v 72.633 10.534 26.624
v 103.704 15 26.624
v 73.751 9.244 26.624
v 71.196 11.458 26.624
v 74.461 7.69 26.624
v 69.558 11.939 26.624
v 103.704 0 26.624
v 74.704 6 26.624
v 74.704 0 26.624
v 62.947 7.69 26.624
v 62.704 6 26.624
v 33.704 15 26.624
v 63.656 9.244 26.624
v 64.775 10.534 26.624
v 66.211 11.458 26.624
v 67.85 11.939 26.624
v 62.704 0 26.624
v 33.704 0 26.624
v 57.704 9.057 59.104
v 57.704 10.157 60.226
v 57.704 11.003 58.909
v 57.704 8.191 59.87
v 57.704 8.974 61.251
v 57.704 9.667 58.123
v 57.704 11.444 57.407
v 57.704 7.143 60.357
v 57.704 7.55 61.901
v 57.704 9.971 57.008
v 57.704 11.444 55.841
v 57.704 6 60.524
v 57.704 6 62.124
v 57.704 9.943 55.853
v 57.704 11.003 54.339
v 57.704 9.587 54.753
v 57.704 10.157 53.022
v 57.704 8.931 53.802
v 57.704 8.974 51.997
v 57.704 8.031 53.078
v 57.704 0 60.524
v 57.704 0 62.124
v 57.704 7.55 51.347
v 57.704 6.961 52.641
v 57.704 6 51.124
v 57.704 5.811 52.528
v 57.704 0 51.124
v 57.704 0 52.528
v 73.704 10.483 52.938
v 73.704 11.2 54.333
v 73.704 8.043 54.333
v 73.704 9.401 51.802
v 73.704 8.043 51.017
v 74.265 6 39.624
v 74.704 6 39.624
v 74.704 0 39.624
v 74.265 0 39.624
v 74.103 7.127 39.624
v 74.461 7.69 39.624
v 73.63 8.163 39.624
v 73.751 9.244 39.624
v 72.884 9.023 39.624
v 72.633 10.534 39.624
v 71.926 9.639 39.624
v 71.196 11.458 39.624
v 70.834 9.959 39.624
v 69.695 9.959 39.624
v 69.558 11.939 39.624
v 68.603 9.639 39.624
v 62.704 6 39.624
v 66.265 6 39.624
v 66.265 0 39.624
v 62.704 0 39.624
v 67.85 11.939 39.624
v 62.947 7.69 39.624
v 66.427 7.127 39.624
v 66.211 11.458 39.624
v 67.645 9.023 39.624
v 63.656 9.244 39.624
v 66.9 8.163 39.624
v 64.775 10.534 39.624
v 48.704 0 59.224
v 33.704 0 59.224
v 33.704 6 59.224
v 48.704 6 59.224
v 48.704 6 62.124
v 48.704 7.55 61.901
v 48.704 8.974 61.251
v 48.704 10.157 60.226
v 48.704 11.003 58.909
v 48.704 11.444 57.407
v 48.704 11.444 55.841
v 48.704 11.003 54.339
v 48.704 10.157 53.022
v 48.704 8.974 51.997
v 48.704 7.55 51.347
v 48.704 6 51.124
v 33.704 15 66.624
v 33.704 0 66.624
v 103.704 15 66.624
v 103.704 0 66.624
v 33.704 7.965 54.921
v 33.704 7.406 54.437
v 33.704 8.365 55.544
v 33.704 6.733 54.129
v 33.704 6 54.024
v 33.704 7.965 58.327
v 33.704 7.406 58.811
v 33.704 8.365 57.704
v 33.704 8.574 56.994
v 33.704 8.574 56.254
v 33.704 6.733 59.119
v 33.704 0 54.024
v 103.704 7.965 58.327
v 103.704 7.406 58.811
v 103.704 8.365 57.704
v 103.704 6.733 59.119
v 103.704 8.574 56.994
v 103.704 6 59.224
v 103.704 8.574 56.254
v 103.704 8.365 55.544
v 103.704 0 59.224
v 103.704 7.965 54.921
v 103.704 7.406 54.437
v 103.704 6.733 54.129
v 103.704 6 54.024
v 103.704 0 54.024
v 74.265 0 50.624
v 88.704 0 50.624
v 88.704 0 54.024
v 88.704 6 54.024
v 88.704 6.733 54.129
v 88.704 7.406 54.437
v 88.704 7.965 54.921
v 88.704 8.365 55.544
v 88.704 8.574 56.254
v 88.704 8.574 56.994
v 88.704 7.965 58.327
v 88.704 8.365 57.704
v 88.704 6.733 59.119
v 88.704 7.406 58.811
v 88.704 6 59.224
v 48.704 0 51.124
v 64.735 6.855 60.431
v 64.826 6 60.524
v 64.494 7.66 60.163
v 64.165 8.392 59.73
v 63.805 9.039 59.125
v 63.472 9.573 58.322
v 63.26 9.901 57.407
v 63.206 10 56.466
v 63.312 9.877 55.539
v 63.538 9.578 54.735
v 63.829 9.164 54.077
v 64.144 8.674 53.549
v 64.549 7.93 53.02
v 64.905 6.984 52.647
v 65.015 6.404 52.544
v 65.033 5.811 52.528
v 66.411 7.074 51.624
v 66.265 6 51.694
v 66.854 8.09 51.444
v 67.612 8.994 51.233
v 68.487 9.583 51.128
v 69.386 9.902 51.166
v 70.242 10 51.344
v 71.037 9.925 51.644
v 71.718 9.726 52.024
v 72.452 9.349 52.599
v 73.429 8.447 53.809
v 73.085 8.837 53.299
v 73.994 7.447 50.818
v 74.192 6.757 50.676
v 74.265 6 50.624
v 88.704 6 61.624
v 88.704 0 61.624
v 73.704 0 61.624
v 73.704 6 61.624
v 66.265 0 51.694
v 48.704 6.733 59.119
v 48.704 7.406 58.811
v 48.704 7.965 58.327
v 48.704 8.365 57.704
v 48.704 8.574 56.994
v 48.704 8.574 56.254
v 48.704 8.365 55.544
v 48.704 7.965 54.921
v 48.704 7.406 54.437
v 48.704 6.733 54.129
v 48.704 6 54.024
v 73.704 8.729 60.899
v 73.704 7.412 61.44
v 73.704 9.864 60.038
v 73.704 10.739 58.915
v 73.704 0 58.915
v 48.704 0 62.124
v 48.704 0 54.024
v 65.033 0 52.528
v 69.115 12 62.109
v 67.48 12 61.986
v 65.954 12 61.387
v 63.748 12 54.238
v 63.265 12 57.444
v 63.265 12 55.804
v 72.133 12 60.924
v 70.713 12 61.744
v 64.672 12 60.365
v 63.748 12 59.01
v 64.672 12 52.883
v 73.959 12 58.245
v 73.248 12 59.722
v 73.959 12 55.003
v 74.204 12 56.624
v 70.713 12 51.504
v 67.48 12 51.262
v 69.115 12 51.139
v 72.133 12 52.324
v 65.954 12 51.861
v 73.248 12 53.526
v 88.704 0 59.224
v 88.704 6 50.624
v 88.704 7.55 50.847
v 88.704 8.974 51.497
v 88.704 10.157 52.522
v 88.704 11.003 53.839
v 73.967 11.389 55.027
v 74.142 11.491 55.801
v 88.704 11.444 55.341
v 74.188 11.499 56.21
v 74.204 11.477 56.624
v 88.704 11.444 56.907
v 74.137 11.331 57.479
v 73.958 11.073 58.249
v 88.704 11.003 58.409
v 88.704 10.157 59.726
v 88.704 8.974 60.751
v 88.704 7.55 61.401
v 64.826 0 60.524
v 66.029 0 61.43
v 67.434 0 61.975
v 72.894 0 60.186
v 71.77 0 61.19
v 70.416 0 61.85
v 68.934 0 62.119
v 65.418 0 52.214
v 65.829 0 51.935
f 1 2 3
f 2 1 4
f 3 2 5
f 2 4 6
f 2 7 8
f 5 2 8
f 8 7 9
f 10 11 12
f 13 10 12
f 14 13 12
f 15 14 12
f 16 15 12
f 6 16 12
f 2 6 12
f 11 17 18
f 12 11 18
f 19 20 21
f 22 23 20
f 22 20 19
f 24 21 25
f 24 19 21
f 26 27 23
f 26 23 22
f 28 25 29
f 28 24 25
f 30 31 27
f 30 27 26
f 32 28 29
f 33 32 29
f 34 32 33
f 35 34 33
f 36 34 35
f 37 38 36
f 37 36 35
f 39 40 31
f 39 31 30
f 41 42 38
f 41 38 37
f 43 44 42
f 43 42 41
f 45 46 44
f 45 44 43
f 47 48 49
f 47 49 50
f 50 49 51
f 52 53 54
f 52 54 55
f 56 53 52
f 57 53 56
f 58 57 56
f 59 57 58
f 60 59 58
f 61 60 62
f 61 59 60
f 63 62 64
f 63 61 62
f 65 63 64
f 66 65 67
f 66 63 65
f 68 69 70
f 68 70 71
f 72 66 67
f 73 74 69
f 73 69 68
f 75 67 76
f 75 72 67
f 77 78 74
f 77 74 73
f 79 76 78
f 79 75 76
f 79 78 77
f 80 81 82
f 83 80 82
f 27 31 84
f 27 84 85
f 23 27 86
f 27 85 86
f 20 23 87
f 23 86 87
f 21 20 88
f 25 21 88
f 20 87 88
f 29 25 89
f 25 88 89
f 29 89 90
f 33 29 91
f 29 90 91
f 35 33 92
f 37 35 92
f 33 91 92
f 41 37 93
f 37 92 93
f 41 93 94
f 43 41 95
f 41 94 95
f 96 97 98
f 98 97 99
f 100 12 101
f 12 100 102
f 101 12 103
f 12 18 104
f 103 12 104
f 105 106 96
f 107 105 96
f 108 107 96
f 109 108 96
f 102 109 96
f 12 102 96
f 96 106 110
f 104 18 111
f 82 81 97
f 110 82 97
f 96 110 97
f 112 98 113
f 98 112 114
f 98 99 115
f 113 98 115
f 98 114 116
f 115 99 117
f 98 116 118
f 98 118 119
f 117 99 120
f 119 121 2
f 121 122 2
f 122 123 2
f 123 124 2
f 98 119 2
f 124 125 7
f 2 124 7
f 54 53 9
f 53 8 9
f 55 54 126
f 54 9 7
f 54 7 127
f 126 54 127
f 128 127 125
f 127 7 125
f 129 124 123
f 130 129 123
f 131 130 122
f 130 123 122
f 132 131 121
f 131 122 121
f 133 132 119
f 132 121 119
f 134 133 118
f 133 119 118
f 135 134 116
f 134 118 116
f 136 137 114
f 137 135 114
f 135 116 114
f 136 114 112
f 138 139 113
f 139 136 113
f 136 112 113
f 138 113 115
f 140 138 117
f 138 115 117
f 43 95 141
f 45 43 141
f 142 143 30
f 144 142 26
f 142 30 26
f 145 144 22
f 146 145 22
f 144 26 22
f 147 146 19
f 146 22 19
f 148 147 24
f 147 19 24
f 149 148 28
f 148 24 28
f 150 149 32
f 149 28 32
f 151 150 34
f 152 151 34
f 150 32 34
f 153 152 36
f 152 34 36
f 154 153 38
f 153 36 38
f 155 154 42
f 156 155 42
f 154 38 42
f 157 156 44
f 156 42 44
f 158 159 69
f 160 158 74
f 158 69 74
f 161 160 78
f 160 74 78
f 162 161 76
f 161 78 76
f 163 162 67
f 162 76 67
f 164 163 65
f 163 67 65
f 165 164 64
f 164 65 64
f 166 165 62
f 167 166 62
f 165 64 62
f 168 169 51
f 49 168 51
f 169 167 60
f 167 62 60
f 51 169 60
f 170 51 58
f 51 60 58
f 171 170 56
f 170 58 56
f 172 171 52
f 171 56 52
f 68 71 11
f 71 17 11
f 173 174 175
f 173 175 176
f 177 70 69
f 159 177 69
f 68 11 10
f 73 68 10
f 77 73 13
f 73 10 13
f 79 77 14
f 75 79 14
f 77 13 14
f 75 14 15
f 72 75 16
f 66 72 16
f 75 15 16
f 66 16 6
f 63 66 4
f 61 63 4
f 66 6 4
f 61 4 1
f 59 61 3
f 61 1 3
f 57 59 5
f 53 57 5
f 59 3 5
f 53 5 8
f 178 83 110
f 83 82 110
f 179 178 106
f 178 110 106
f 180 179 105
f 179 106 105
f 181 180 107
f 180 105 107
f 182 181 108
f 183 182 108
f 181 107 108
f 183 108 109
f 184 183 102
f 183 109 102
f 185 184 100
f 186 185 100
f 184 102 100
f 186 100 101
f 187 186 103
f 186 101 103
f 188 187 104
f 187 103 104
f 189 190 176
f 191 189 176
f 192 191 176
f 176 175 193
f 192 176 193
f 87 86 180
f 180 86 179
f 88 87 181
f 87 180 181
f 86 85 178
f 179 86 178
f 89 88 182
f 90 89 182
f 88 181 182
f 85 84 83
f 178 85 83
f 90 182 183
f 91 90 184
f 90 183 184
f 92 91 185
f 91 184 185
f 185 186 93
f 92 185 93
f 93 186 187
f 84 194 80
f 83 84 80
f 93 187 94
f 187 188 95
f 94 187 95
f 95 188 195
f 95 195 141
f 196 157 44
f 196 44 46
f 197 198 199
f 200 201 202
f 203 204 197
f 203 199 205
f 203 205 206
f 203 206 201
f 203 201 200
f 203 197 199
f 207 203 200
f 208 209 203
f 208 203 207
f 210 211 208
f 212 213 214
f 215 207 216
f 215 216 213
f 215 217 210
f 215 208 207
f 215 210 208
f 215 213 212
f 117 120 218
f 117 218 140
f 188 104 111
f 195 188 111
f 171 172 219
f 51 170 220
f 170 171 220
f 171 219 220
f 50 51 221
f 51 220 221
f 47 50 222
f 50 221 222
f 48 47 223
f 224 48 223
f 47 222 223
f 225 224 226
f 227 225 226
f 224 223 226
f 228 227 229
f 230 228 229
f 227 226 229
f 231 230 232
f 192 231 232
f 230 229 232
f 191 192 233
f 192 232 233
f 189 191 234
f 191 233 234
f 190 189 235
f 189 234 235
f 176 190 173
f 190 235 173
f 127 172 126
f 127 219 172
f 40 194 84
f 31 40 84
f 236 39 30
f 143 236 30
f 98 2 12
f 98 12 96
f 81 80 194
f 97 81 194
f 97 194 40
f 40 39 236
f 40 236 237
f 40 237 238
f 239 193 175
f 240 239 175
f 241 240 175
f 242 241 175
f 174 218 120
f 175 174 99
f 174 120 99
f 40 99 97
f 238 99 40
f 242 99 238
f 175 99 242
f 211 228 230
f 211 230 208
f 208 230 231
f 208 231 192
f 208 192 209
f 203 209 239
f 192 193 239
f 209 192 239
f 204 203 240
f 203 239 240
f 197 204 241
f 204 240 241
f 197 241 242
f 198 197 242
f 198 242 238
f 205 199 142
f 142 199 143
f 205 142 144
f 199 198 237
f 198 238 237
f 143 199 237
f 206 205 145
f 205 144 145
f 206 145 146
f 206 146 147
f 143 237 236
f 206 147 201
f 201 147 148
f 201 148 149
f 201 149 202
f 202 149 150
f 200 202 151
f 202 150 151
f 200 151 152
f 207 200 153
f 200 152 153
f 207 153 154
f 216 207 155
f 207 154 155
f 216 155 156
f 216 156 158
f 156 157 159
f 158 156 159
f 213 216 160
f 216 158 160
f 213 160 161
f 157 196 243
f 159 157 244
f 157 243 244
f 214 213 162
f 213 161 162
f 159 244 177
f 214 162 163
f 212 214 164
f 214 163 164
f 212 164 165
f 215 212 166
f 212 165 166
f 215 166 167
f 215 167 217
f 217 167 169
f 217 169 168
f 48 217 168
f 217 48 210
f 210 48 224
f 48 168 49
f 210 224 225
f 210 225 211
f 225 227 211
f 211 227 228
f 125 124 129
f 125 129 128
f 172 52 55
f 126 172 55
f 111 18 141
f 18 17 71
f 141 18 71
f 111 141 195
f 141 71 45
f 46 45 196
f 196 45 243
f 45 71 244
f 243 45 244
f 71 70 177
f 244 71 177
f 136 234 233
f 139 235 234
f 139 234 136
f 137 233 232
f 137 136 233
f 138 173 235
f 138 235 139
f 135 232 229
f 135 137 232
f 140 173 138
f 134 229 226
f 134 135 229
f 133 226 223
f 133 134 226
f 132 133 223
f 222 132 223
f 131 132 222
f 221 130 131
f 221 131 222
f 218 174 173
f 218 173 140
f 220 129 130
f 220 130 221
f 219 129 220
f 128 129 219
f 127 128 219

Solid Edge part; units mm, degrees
sketch "Sketch1" plane through (0, 0, 0) normal (0, -1, 0) x (1, 0, 0)
  line L0 (33.7037, 66.6239) -> (103.7037, 66.6239)
  line L1 (103.7037, 66.6239) -> (103.7037, 26.6239)
  line L2 (103.7037, 26.6239) -> (33.7037, 26.6239)
  line L3 (33.7037, 26.6239) -> (33.7037, 66.6239)
  dimension "D1" = 70
  dimension "D2" = 40
  dimension "D3" = 70
  dimension "D4" = 40
extrude "Protrusion1" add sketch "Sketch1" against normal blind 15
sketch "Sketch2" plane through (68.7037, 0, 46.6239) normal (0, -1, 0) x (1, 0, 0)
  circle A0 centre (0, 10) radius 5.5
  dimension "D1" = 11
  dimension "D2" = 10
extrude "ExtrudedCutout_1" cut sketch "Sketch2" against normal blind 12
sketch "Sketch3" plane through (103.7037, 7.5, 46.6239) normal (1, 0, 0) x (0, 1, 0)
  line L0 (-7.5, 12.6) -> (-1.5, 12.6)
  arc A0 (-1.5, 12.6) -> (-1.5, 7.4) centre (-1.5, 10) cw
  line L1 (-1.5, 7.4) -> (-7.5, 7.4)
  line L2 (-7.5, 7.4) -> (-7.5, 12.6)
  dimension "D1" = 6
  dimension "D2" = 7.4
  dimension "D3" = 2.6
extrude "ExtrudedCutout_4" cut sketch "Sketch3" against normal blind 15
sketch "Sketch4" plane through (88.7037, 4.3, 55.6239) normal (1, 0, 0) x (0, 1, 0)
  line L0 (-4.3, 6) -> (1.7, 6)
  arc A0 (1.7, 6) -> (1.7, -5) centre (1.7, 0.5) cw
  line L1 (1.7, -5) -> (-4.3, -5)
  line L2 (-4.3, -5) -> (-4.3, 6)
  dimension "D1" = 6
  dimension "D2" = 5
  dimension "D3" = 5.5
extrude "ExtrudedCutout_5" cut sketch "Sketch4" against normal blind 15
sketch "Sketch5" plane through (33.7037, 7.5, 46.6239) normal (-1, 0, 0) x (0, -1, 0)
  line L0 (7.5, 12.6) -> (1.5, 12.6)
  arc A0 (1.5, 12.6) -> (1.5, 7.4) centre (1.5, 10) ccw
  line L1 (1.5, 7.4) -> (7.5, 7.4)
  line L2 (7.5, 7.4) -> (7.5, 12.6)
  dimension "D1" = 6
  dimension "D2" = 7.4
  dimension "D3" = 2.6
extrude "ExtrudedCutout_6" cut sketch "Sketch5" against normal blind 15
sketch "Sketch6" plane through (48.7037, 4.3, 56.6239) normal (-1, 0, 0) x (0, -1, 0)
  line L0 (4.3, 5.5) -> (-1.7, 5.5)
  arc A0 (-1.7, 5.5) -> (-1.7, -5.5) centre (-1.7, 0) ccw
  line L1 (-1.7, -5.5) -> (4.3, -5.5)
  line L2 (4.3, -5.5) -> (4.3, 5.5)
  dimension "D1" = 4.5
  dimension "D2" = 5.5
  dimension "D3" = 6
extrude "ExtrudedCutout_7" cut sketch "Sketch6" against normal blind 9
sketch "Sketch7" plane through (57.7037, 5.75, 56.6239) normal (-1, 0, 0) x (0, -1, 0)
  line L0 (5.75, 3.9) -> (-0.25, 3.9)
  arc A0 (-0.25, 3.9) -> (-0.0606, -4.0955) centre (-0.25, -0.1) ccw
  line L1 (-0.0606, -4.0955) -> (5.75, -4.0955)
  line L2 (5.75, -4.0955) -> (5.75, 3.9)
  dimension "D1" = 6
  dimension "D2" = 6.1
  dimension "D3" = 4
extrude "Cutout1" cut sketch "Sketch7" against normal up to next
sketch "Sketch8" plane through (68.7037, 7.5, 26.6239) normal (0, 0, -1) x (1, 0, 0)
  line L0 (-6, 7.5) -> (-6, 1.5)
  arc A0 (-6, 1.5) -> (6, 1.5) centre (0, 1.5) ccw
  line L1 (6, 1.5) -> (6, 7.5)
  line L2 (6, 7.5) -> (-6, 7.5)
  dimension "D1" = 6
  dimension "D2" = 6
  dimension "D3" = 6
extrude "ExtrudedCutout_9" cut sketch "Sketch8" against normal blind 13
sketch "Sketch9" plane through (68.7037, 5.75, 39.6239) normal (0, 0, -1) x (1, 0, 0)
  line L0 (-2.4391, 5.75) -> (-2.4391, -0.25)
  arc A0 (-2.4391, -0.25) -> (5.5609, -0.25) centre (1.5609, -0.25) ccw
  line L1 (5.5609, -0.25) -> (5.5609, 5.75)
  line L2 (5.5609, 5.75) -> (-2.4391, 5.75)
  dimension "D1" = 6
  dimension "D2" = 4
  dimension "D3" = 3
extrude "Cutout2" cut sketch "Sketch9" against normal up to next
